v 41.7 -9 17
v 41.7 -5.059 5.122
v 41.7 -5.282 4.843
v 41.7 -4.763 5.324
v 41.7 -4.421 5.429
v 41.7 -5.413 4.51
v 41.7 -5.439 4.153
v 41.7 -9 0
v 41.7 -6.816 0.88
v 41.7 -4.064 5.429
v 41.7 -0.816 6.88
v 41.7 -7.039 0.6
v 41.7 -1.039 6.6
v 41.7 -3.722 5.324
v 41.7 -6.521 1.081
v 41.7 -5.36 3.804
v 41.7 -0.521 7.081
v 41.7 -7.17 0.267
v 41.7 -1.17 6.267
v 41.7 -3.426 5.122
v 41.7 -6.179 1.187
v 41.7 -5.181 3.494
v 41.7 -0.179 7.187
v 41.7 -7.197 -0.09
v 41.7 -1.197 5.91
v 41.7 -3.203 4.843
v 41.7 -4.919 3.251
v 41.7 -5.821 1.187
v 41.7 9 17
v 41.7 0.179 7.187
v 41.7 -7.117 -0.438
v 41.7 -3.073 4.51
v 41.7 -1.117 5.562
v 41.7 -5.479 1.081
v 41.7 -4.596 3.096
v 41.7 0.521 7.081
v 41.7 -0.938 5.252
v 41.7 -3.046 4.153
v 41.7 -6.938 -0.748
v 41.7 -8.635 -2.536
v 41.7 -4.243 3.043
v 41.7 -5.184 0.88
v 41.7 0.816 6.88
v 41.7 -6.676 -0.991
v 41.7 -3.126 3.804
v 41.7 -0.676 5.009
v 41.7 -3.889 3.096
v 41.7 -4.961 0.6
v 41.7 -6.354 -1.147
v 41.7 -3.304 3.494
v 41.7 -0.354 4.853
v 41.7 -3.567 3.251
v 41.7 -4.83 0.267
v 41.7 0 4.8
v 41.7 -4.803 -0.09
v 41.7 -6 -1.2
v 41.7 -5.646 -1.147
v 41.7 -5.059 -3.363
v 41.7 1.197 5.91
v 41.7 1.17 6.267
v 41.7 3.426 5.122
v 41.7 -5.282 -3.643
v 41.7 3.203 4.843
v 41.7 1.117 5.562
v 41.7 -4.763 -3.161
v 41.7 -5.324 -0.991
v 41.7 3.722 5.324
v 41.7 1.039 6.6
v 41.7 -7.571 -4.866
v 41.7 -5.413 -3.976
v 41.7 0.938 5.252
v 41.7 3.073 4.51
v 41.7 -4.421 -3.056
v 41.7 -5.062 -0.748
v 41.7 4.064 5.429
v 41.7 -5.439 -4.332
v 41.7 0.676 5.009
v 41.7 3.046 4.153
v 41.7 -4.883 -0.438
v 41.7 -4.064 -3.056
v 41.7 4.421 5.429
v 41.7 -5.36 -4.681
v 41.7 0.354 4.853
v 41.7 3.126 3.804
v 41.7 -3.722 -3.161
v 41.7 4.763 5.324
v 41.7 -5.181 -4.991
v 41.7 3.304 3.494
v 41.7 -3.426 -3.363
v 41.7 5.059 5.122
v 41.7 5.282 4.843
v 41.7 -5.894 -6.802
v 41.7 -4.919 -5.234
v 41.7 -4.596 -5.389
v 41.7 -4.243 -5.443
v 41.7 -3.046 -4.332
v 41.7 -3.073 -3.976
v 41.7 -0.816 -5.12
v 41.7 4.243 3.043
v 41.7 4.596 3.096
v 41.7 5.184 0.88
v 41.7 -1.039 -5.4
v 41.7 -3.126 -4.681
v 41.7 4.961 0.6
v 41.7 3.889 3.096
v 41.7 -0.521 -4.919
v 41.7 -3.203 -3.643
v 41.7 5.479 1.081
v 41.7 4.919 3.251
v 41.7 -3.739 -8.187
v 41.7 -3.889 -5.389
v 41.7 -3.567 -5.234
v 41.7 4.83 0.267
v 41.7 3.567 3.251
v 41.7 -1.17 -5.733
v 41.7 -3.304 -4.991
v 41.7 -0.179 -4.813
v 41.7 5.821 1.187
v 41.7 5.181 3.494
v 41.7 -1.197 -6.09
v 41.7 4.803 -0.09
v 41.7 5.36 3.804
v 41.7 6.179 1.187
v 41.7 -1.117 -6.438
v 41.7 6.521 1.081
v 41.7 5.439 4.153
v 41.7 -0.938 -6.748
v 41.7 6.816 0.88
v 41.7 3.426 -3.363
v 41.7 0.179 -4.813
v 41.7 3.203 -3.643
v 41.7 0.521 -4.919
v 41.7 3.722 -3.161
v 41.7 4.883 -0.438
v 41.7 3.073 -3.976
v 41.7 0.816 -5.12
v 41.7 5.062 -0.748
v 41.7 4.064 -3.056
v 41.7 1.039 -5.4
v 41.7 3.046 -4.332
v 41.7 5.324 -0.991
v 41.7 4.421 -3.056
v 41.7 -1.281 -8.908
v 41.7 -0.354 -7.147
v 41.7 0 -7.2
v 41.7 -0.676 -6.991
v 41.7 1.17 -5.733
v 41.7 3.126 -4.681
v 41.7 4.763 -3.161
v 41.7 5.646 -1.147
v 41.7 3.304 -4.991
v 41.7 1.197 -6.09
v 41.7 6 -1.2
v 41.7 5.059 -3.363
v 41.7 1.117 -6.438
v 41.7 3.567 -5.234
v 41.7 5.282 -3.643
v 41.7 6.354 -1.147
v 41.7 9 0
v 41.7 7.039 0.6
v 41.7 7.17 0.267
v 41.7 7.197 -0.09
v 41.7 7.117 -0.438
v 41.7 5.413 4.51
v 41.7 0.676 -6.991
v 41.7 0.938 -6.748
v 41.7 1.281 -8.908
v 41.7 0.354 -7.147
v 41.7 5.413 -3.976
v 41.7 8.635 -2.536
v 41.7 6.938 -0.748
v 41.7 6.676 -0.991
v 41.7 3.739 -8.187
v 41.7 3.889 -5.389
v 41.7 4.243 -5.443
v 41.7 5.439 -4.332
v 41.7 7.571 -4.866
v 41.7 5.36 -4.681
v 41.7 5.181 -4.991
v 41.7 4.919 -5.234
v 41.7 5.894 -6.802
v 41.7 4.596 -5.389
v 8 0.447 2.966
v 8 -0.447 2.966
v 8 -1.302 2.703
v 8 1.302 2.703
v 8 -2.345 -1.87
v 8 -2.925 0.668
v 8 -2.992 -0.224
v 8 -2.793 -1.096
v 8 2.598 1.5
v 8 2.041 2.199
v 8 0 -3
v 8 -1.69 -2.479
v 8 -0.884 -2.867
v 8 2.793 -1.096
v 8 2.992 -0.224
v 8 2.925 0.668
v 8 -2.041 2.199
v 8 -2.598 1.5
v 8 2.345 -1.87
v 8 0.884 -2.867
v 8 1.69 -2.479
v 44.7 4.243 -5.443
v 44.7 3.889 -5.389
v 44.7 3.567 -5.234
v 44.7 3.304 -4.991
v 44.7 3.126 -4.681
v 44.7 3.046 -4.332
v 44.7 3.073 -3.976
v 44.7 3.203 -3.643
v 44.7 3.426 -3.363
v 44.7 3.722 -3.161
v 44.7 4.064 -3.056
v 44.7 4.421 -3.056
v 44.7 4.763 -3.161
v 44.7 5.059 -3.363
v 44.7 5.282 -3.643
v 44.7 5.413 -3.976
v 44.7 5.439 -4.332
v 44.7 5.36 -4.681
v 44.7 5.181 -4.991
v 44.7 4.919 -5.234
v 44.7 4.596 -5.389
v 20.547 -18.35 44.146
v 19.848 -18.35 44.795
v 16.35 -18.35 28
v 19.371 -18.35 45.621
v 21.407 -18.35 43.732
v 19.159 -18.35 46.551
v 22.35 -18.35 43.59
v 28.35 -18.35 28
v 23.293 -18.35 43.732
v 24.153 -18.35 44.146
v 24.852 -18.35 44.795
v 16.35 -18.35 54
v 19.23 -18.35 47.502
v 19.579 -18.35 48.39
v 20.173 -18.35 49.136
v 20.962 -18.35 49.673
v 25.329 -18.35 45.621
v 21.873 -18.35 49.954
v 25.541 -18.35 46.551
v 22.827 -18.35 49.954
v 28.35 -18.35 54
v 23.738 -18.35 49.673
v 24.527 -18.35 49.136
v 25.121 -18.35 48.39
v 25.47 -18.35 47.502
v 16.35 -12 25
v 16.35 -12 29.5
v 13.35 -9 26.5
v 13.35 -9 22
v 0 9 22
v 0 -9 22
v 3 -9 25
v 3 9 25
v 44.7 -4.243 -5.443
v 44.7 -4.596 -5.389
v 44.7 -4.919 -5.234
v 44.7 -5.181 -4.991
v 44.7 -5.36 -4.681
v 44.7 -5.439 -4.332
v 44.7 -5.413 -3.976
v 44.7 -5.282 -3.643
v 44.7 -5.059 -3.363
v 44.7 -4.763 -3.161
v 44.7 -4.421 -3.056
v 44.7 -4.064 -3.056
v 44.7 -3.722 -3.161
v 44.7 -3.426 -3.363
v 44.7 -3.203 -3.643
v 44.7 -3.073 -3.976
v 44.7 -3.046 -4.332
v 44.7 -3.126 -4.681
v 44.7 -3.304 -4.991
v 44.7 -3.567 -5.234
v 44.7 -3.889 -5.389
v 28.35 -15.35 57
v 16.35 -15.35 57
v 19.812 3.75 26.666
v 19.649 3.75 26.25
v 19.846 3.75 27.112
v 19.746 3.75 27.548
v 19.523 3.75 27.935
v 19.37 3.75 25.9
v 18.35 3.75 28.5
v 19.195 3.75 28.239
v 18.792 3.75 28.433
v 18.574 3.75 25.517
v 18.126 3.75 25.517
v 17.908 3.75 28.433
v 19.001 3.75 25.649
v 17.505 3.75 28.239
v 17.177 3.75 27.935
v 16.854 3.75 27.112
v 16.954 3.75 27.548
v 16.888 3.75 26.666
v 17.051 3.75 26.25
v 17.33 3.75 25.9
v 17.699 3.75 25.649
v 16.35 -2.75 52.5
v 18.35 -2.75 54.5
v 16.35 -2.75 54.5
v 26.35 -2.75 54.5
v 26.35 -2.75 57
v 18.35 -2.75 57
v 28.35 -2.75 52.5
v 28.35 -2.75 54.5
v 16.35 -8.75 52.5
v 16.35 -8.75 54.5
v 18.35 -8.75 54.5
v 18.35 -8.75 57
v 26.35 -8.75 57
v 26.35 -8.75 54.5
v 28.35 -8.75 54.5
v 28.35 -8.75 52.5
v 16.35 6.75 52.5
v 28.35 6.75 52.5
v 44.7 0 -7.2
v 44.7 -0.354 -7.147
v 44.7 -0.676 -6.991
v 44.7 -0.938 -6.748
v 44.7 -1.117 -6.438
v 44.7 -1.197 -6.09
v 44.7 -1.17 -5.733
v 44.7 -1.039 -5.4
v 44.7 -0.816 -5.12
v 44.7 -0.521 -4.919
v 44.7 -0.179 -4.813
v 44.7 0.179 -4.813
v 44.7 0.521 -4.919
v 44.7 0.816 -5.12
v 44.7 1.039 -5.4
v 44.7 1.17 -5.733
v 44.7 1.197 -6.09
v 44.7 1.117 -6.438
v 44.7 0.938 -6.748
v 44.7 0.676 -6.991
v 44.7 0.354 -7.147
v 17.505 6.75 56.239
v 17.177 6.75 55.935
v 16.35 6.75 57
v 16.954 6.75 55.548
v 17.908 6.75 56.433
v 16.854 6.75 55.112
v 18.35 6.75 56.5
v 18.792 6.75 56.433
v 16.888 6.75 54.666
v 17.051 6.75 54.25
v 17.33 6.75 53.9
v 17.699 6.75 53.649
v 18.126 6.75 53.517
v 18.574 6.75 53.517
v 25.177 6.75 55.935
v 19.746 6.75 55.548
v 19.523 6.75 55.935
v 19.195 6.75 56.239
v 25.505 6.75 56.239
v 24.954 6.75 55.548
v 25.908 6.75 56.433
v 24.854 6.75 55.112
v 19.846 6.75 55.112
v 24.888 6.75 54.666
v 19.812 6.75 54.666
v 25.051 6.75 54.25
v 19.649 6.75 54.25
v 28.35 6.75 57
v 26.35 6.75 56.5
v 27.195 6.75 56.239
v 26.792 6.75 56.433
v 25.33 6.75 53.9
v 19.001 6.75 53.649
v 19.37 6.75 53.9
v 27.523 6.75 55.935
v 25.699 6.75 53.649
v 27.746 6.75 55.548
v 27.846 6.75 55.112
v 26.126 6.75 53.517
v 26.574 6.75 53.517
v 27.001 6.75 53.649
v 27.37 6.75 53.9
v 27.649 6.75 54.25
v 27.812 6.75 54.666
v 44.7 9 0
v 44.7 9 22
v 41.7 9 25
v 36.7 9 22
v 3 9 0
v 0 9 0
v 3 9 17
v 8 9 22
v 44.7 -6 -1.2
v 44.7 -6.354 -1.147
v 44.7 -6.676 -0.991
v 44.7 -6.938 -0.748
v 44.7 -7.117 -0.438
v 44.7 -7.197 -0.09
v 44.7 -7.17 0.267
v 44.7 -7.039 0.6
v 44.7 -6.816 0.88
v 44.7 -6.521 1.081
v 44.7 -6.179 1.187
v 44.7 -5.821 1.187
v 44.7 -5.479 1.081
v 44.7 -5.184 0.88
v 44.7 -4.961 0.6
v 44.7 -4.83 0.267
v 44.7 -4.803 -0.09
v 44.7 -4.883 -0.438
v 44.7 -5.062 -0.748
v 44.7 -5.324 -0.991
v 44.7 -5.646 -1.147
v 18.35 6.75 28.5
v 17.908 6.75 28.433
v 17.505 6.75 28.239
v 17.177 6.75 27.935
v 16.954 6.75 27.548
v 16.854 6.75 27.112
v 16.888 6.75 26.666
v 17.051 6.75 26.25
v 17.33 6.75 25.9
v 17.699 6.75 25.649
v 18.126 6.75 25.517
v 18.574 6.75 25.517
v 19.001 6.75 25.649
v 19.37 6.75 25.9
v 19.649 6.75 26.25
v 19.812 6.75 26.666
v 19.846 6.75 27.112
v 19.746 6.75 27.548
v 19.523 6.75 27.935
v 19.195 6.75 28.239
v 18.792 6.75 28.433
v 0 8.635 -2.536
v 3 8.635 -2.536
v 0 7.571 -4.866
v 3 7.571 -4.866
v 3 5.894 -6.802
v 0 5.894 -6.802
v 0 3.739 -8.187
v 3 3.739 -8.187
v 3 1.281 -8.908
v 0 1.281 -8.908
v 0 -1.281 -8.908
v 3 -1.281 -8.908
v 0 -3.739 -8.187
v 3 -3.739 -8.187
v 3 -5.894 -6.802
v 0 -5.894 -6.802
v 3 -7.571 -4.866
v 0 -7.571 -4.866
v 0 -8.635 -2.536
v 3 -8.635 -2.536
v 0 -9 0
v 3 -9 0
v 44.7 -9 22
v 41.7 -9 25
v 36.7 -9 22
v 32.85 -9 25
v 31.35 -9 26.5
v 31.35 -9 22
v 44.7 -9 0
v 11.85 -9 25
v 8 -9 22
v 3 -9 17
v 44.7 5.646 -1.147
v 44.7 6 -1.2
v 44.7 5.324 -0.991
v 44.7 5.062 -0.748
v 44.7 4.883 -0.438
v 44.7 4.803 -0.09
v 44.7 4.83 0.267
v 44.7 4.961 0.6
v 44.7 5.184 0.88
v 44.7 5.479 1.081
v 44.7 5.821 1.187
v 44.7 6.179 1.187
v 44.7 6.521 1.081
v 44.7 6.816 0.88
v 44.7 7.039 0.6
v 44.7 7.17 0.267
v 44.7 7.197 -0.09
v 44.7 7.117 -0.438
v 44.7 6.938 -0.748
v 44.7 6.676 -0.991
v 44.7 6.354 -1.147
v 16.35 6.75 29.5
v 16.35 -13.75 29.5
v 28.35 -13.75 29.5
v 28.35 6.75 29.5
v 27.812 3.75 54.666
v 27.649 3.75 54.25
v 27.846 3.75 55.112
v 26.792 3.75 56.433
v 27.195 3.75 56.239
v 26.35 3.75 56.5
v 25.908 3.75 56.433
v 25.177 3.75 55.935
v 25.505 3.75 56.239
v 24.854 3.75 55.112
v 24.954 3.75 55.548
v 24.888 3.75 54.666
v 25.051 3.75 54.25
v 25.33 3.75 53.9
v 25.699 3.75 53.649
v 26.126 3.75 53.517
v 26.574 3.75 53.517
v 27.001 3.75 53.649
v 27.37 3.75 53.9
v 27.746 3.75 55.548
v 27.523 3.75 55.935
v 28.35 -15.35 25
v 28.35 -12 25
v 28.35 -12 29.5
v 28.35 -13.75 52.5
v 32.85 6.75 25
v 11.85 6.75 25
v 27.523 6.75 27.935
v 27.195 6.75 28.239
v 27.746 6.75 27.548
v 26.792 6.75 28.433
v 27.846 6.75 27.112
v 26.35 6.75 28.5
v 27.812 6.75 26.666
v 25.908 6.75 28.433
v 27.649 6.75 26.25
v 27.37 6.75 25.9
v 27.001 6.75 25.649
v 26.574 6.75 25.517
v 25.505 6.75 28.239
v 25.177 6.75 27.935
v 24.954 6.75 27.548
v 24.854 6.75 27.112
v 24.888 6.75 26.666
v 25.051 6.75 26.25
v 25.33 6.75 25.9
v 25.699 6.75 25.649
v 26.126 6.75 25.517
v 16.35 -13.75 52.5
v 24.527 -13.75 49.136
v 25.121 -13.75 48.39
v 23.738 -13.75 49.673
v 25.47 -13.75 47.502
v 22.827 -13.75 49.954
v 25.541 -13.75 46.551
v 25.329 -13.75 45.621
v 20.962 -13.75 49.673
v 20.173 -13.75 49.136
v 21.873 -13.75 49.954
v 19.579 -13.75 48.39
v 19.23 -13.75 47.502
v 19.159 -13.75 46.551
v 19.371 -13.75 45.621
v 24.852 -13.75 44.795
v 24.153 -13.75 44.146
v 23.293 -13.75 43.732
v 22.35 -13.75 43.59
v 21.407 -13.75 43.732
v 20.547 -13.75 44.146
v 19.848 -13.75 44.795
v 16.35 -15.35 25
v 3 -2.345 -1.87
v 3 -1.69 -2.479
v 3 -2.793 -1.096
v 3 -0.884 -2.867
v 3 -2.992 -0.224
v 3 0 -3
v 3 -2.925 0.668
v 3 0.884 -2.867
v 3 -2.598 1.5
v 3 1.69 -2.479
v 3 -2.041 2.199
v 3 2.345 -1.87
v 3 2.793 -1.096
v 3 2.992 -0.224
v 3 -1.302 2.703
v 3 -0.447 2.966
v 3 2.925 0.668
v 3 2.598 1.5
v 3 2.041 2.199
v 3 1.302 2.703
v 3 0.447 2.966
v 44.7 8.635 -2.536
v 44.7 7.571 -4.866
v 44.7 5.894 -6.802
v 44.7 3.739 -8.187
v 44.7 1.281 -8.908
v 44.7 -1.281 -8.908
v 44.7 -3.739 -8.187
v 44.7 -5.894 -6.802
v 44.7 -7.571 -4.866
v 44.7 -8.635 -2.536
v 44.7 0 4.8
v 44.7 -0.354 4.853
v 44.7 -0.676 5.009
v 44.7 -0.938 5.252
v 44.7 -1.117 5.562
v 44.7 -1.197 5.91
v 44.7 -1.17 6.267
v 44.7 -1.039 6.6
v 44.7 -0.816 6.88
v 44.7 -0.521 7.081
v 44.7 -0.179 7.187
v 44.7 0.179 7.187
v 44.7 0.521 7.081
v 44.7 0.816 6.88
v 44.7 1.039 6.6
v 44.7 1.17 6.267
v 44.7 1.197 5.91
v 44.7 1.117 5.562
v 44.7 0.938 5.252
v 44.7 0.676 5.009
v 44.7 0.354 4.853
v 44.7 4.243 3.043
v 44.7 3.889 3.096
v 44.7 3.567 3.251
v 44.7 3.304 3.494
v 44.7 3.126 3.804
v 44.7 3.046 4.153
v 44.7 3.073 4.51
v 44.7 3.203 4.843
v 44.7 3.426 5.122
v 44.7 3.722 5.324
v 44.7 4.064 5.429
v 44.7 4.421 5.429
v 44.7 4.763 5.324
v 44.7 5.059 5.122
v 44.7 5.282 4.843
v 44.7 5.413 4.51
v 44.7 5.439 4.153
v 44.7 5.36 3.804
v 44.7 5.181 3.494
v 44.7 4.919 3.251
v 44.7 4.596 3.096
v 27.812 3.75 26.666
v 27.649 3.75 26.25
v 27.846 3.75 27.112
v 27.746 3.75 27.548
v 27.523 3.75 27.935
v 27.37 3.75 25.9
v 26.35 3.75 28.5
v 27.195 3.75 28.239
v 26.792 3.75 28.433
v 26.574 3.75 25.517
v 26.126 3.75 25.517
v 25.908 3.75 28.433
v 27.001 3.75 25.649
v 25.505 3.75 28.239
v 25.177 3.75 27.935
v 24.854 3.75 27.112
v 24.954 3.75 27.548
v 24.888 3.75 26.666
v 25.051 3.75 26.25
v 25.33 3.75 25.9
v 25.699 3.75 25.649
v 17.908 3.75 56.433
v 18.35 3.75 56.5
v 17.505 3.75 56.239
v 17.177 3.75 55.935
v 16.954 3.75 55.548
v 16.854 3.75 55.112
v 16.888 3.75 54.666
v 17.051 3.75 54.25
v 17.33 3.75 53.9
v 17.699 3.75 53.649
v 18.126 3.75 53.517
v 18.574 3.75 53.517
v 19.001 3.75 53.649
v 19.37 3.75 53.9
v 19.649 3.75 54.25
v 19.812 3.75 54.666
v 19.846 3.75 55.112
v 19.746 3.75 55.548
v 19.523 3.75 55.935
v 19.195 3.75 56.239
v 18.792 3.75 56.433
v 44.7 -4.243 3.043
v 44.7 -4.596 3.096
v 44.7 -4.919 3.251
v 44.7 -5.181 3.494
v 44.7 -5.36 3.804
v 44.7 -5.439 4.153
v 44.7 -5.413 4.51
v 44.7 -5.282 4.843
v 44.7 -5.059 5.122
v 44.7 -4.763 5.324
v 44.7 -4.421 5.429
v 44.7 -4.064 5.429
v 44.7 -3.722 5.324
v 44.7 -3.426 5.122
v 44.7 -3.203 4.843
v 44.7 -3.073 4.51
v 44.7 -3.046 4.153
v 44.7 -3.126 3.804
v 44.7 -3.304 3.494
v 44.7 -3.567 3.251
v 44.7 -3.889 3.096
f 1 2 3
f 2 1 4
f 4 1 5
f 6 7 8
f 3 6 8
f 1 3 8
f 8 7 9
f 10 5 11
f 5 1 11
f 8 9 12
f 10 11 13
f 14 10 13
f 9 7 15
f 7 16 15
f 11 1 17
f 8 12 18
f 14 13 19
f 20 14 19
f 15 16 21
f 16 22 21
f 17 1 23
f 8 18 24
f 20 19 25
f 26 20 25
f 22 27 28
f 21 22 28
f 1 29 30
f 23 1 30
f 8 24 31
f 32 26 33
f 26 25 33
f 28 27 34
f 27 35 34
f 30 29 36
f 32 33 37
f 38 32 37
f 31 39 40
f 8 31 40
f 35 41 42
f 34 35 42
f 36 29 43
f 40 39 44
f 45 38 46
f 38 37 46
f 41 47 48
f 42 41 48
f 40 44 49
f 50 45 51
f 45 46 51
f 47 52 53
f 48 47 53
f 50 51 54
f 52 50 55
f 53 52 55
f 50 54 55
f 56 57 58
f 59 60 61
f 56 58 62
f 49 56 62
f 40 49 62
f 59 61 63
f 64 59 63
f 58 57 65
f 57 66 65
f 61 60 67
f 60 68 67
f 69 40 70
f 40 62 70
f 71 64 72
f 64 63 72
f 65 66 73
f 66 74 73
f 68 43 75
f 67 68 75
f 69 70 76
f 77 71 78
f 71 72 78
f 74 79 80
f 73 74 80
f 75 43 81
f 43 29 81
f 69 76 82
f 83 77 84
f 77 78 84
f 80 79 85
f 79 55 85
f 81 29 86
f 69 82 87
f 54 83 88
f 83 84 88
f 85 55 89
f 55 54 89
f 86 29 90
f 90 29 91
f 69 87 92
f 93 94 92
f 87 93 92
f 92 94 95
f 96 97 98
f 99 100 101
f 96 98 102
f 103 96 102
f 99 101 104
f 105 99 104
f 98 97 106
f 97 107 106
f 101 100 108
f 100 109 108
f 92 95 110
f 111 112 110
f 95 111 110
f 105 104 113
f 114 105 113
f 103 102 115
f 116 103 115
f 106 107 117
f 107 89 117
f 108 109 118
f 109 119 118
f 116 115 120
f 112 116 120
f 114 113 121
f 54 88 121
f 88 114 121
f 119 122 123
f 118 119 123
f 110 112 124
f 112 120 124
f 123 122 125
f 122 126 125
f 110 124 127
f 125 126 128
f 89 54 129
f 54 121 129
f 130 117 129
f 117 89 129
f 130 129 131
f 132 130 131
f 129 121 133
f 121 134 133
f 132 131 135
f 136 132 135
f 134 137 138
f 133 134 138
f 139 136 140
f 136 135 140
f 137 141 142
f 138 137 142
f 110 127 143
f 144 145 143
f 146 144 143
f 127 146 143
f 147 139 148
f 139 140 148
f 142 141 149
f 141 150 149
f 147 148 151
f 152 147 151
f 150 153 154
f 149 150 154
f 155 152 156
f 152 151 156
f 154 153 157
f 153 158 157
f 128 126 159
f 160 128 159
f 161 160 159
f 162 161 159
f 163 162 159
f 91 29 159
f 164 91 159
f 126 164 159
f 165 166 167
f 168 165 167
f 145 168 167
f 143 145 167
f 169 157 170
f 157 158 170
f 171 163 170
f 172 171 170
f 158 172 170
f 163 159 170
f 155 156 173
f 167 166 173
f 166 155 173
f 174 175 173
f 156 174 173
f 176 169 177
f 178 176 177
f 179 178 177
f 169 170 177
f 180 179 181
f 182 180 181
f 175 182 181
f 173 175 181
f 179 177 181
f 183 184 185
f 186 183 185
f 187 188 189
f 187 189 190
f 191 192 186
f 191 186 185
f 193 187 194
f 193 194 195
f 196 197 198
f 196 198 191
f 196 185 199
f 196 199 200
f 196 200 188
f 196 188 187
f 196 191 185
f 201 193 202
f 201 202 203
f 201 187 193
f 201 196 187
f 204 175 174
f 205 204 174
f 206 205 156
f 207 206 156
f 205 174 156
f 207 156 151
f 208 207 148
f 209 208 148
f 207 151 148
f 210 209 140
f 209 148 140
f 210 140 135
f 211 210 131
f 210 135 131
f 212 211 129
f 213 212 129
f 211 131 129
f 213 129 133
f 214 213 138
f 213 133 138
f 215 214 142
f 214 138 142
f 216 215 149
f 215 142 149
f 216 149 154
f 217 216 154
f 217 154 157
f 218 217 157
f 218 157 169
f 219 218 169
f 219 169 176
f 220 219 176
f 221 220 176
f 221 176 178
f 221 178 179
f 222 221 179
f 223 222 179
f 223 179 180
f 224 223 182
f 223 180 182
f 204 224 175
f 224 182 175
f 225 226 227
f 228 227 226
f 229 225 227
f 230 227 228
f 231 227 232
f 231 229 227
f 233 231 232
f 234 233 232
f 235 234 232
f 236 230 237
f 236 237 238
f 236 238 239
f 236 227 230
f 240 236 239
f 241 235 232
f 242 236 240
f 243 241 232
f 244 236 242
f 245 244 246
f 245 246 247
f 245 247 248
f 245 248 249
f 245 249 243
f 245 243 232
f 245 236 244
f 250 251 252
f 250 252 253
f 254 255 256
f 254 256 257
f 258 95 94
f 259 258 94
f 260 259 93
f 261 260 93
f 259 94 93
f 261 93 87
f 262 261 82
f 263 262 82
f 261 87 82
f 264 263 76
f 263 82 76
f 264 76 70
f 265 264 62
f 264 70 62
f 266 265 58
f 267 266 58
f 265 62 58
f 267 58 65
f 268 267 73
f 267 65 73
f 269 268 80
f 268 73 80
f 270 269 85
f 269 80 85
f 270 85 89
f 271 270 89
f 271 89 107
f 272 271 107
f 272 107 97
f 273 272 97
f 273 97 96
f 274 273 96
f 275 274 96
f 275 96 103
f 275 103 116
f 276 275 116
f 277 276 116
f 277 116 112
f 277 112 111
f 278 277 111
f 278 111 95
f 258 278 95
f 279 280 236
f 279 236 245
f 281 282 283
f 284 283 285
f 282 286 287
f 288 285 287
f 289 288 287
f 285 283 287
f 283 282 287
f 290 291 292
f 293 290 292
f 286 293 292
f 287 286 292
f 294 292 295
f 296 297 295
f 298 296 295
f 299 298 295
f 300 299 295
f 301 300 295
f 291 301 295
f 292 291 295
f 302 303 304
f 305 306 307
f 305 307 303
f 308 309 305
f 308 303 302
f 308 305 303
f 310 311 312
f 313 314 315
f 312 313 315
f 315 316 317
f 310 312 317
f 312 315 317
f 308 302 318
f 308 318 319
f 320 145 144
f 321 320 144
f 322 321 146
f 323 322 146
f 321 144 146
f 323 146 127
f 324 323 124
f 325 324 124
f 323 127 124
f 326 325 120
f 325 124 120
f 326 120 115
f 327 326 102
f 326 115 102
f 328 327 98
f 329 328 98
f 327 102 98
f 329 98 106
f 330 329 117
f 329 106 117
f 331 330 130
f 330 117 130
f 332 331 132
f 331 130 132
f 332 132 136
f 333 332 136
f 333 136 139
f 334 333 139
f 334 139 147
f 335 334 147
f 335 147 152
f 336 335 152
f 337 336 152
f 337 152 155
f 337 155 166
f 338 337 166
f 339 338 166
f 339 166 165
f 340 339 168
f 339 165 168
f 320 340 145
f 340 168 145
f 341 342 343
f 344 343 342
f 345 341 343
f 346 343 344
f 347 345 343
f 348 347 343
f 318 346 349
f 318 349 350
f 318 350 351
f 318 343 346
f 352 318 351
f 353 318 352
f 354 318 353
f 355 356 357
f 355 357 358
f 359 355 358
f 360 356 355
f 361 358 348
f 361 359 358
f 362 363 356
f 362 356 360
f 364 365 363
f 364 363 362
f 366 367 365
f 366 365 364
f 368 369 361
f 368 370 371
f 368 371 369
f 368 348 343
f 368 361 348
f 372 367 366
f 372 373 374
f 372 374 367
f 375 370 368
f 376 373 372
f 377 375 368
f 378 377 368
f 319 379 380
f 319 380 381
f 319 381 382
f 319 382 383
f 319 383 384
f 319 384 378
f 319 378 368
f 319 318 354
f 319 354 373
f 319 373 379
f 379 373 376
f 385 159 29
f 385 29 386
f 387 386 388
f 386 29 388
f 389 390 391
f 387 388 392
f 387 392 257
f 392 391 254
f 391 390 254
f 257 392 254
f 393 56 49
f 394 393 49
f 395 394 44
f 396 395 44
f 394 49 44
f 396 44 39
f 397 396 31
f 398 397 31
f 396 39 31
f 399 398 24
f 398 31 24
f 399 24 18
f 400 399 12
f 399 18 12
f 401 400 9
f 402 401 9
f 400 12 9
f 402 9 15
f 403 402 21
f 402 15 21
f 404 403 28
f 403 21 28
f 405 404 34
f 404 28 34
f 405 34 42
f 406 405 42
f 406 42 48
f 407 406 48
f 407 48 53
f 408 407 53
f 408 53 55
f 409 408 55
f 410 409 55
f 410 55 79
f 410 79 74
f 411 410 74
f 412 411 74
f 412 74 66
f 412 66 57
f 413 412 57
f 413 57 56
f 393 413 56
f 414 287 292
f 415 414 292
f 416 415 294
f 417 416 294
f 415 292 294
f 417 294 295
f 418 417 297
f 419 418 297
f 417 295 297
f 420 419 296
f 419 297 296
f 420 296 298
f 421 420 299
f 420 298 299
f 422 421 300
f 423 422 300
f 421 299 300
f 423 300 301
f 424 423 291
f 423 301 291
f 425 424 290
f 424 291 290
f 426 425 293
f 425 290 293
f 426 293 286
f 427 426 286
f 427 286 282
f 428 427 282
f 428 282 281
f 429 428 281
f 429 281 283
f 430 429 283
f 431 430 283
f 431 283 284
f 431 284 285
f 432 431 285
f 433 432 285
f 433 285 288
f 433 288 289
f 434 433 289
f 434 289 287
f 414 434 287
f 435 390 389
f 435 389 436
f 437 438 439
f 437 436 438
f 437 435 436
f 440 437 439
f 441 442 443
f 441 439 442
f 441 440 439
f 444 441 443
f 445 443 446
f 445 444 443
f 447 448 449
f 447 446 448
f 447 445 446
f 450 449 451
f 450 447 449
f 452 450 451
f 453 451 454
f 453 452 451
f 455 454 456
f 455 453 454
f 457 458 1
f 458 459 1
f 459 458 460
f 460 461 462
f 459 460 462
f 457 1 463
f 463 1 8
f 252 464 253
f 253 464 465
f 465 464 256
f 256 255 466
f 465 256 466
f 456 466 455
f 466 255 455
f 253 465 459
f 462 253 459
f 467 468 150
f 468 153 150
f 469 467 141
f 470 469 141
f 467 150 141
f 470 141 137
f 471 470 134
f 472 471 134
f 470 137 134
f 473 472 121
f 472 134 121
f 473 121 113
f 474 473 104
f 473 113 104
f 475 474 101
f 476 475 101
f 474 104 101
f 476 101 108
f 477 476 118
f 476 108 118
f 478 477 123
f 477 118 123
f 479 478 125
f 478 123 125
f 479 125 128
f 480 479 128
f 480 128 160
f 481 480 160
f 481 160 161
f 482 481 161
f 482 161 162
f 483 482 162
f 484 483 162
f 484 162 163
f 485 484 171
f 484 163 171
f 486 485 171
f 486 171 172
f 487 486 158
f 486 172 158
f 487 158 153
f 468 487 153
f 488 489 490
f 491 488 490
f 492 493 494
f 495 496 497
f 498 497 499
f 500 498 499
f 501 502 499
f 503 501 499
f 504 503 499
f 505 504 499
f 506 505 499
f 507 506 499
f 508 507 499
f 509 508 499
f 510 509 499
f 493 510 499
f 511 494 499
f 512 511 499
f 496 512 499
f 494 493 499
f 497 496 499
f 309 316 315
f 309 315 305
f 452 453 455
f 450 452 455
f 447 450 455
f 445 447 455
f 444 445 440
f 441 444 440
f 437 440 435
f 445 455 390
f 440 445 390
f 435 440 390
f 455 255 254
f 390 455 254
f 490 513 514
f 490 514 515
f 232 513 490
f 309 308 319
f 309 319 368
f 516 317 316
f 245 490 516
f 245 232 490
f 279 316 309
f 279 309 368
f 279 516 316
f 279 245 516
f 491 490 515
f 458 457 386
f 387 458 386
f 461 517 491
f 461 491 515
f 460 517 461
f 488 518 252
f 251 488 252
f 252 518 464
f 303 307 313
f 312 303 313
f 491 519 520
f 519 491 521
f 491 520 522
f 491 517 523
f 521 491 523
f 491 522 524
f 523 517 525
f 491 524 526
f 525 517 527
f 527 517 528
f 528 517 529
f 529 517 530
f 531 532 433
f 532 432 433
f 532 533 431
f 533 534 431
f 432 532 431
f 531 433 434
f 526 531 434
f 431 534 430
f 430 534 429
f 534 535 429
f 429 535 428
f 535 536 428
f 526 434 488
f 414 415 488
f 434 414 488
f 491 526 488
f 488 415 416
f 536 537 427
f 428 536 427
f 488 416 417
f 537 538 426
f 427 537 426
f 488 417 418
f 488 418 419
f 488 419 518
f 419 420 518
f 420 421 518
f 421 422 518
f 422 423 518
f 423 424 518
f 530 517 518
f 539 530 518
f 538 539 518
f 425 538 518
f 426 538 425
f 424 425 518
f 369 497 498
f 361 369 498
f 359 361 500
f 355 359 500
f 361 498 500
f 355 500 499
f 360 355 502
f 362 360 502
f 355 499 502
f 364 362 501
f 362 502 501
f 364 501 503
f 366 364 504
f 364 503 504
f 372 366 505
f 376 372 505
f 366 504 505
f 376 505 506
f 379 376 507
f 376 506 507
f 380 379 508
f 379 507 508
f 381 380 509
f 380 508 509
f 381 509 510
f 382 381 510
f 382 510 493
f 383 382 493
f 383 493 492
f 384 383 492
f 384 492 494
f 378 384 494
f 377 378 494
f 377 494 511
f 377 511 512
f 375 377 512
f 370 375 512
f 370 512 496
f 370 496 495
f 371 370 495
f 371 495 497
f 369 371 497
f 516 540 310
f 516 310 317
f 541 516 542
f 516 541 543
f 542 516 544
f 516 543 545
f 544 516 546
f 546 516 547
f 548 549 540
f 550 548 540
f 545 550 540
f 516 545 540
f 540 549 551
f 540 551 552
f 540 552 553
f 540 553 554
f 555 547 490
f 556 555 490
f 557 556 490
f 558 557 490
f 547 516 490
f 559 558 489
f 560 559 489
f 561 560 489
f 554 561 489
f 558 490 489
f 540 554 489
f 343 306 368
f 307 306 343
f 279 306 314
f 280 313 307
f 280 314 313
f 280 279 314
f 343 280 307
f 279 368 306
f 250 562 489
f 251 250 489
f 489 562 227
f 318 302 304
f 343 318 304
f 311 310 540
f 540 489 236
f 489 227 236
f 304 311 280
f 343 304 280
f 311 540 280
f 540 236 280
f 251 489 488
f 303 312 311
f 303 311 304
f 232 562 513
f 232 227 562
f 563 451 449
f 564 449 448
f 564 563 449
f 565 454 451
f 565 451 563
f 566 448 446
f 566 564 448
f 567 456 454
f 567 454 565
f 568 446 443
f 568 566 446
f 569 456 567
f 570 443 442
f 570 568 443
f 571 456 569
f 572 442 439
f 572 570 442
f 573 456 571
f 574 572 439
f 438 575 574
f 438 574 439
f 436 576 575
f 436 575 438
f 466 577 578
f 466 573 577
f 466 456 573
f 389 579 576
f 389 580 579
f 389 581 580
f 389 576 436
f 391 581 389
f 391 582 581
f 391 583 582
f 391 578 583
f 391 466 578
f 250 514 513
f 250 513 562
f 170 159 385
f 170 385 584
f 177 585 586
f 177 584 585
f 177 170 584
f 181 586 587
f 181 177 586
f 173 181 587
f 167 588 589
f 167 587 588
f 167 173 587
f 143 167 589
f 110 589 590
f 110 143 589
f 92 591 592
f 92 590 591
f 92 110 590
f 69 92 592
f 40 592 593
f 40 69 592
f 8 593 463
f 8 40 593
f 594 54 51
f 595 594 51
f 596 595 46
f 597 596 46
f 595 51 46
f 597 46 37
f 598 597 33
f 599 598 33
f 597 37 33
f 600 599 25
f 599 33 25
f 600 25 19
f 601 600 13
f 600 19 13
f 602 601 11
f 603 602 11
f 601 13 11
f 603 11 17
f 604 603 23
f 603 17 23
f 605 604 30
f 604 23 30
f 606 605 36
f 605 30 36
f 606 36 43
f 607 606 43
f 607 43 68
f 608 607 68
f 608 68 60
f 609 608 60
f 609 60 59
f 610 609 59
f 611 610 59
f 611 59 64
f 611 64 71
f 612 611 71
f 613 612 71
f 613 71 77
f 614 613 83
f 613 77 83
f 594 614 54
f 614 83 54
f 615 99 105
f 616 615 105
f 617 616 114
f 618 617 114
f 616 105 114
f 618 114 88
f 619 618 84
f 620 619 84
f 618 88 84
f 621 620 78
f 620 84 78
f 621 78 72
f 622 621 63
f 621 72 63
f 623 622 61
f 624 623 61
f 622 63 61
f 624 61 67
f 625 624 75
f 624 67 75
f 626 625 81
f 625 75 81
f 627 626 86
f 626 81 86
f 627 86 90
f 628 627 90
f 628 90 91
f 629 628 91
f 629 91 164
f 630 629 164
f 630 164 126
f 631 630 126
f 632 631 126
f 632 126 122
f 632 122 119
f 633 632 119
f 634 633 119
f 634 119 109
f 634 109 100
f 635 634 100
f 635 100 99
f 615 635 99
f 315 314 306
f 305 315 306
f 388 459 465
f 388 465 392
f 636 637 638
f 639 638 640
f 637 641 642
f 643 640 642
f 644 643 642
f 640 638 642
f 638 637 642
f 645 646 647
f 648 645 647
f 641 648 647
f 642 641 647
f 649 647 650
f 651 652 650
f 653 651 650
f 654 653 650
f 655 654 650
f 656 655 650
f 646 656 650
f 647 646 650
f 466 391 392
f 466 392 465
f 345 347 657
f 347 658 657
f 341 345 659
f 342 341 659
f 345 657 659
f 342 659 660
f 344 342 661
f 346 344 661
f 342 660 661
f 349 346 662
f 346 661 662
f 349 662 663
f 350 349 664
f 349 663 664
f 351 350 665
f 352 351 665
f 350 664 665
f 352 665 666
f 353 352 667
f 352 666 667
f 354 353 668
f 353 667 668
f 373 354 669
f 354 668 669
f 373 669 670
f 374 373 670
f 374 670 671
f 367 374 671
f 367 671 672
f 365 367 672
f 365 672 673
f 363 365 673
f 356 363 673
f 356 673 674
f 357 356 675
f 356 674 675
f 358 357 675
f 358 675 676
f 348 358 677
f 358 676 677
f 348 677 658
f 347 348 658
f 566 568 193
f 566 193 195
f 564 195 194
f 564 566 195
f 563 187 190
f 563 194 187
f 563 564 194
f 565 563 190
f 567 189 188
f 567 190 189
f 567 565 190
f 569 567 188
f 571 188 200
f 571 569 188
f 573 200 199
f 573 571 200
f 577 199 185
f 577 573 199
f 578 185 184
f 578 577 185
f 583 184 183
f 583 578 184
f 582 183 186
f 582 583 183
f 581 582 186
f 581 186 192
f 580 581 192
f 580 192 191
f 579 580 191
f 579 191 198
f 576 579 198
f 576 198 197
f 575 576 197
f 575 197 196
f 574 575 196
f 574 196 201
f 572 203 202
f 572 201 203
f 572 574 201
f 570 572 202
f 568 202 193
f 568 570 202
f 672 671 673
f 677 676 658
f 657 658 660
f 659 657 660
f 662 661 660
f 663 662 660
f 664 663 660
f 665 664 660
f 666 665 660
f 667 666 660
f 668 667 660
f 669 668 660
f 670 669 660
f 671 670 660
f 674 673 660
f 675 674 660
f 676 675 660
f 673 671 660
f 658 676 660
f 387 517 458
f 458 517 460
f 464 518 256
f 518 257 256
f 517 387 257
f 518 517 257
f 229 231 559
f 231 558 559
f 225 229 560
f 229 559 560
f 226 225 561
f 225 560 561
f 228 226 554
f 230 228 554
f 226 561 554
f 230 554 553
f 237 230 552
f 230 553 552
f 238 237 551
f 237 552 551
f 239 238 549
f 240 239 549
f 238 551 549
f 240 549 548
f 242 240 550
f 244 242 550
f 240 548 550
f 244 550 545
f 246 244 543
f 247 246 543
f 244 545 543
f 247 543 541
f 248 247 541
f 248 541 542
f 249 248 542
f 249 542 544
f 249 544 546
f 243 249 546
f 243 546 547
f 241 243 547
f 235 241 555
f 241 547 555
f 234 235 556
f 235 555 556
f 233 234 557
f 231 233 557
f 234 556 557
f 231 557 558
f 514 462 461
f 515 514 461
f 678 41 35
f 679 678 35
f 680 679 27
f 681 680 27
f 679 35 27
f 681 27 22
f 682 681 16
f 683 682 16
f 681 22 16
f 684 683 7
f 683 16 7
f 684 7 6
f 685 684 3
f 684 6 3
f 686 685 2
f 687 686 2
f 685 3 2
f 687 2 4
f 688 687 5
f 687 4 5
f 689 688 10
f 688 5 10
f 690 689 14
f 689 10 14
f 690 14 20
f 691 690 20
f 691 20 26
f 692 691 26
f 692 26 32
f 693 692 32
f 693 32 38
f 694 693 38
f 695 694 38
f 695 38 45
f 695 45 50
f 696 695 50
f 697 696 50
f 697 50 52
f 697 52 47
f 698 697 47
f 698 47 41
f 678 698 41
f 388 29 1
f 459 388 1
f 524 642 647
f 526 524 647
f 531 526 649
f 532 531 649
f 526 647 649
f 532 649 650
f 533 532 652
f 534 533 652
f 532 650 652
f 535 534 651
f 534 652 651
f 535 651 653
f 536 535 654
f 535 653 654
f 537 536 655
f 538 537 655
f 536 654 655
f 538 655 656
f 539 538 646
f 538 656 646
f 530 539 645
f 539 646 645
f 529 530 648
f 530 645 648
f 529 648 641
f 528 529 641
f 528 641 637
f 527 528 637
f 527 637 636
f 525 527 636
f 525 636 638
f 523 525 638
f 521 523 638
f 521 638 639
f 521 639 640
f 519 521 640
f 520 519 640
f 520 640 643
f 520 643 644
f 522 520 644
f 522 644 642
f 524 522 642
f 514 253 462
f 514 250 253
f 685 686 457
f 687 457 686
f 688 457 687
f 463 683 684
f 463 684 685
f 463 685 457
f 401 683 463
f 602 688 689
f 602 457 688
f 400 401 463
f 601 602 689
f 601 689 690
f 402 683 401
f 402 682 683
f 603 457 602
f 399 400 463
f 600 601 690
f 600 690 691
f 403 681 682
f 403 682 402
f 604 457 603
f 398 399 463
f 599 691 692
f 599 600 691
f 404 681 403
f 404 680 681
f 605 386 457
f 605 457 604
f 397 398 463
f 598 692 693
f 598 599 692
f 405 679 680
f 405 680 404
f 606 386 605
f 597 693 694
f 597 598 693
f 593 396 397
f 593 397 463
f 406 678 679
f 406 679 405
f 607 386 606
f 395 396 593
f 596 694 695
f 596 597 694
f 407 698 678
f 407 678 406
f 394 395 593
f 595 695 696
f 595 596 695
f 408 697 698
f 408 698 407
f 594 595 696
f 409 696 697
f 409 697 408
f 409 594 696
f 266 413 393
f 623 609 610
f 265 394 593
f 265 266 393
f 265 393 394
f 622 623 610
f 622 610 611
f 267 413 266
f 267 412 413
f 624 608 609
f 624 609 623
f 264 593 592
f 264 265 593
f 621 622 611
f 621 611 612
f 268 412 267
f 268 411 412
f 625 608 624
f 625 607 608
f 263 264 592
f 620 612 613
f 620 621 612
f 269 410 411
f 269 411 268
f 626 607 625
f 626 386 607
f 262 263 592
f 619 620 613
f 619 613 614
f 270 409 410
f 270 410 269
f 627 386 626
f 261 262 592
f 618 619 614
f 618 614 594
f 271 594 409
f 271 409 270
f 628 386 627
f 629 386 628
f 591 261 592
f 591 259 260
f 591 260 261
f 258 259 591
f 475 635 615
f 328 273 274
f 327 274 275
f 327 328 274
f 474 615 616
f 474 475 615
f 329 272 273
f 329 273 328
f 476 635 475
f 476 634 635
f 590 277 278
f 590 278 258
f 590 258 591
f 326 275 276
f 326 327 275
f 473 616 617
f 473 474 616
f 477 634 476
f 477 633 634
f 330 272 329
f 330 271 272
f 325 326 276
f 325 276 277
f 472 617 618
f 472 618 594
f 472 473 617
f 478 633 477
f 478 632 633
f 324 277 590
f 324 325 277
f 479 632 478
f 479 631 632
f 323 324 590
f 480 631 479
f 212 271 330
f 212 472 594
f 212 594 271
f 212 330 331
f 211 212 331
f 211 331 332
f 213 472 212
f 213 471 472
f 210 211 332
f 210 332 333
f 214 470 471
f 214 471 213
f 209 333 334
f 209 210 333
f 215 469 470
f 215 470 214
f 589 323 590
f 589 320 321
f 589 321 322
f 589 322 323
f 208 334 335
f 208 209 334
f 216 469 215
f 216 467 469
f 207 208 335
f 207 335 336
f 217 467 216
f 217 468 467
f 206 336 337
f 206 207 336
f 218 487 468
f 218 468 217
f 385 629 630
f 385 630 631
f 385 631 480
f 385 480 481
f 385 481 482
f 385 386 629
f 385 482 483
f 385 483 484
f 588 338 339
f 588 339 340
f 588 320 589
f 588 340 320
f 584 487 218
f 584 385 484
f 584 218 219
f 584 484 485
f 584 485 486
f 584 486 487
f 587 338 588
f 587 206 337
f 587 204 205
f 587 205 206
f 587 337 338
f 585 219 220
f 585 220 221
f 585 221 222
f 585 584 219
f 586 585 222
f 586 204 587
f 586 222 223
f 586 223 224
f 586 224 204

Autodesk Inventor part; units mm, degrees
ref_plane "YZ Plane" through (0, 0, 0) normal (1, 0, 0) x (0, 1, 0)
ref_plane "XZ Plane" through (0, 0, 0) normal (0, 1, 0) x (-1, 0, 0)
ref_plane "XY Plane" through (0, 0, 0) normal (0, 0, 1) x (1, 0, 0)
sketch "スケッチ1" plane through (0, 0, 0) normal (1, 0, 0) x (0, 1, 0)
  circle A0 centre (0, 0) radius 9
  line L0 (9, 0) -> (-9, 0)
  line L1 (-9, 0) -> (-9, 25)
  line L2 (-9, 25) -> (9, 25)
  line L3 (9, 25) -> (9, 0)
  dimension "d0" = 18
  dimension "d1" = 25
  dimension "d2" = 18
extrude "押し出し1" add sketch "スケッチ1" along normal blind 3
sketch "スケッチ2" plane through (3, 0, 0) normal (1, 0, 0) x (0, 0, -1)
  line L0 (-25, 9) -> (-25, -9) projected
  line L1 (-25, -9) -> (-22, -9)
  line L2 (-22, -9) -> (-22, 9)
  line L3 (-22, 9) -> (-25, 9)
  line L4 (-25, 9) -> (-25, -9)
  line L5 (0, 9) -> (-25, 9) projected
  point P0 (0, 0)
  point P1 (-25, 9)
  dimension "d5" = 3
extrude "押し出し2" add sketch "スケッチ2" along normal blind 38.7
sketch "スケッチ3" plane through (41.7, 0, 0) normal (1, 0, 0) x (0, 0, -1)
  line L0 (-22, 9) -> (-22, -9) projected
  line L1 (-22, -9) -> (0, -9) projected
  arc A0 (0, -9) -> (0, 9) centre (0, 0) ccw projected
  line L2 (0, 9) -> (-22, 9) projected
  line L3 (-22, -9) -> (-22, 9) projected
  line L4 (-22, 9) -> (-25, 9) projected
  line L5 (-25, 9) -> (-25, -9) projected
  line L6 (-25, -9) -> (-22, -9) projected
extrude "押し出し3" add sketch "スケッチ3" along normal blind 3
sketch "スケッチ4" plane through (0, -9, 25) normal (0, 0, 1) x (1, 0, 0)
  line L0 (28.35, 22.75) -> (16.35, 22.75)
  line L1 (16.35, 22.75) -> (16.35, -4.75)
  line L2 (16.35, -4.75) -> (28.35, -4.75)
  line L3 (28.35, -4.75) -> (28.35, 22.75)
  line L4 (28.35, 22.75) -> (16.35, -4.75) construction
  line L5 (16.35, 22.75) -> (28.35, -4.75) construction
  line L6 (44.7, 18) -> (44.7, 0) projected
  line L7 (0, 0) -> (44.7, 0) projected
  line L8 (28.35, 15.75) -> (16.35, 15.75)
  point P0 (0, 9)
  point P1 (22.35, 9)
  dimension "d10" = 12
  dimension "d11" = 27.5
  dimension "d12" = 22.35
  dimension "d13" = 9
  dimension "d16" = 7
extrude "押し出し4" add sketch "スケッチ4" along normal blind 4.5 contours L3 L7 L1 L8 | L3 L2 L1 L7
sketch "スケッチ5" plane through (0, -9, 25) normal (0, 0, -1) x (-1, 0, 0)
  line L0 (-28.35, -4.75) -> (-28.35, 0) projected
  line L1 (-28.35, -4.75) -> (-16.35, -4.75)
  line L2 (-16.35, -4.75) -> (-16.35, -10.35)
  line L3 (-16.35, -10.35) -> (-28.35, -10.35)
  line L4 (-28.35, -10.35) -> (-28.35, -4.75)
  line L5 (-16.35, 15.75) -> (-16.35, -4.75) projected
  point P0 (0, 9)
  dimension "d17" = 5.6
extrude "押し出し5" add sketch "スケッチ5" against normal blind 32
sketch "スケッチ6" plane through (16.35, -13.75, 29.5) normal (0, 1, 0) x (1, 0, 0)
  line L0 (0, 0) -> (0, -27.5) projected
  line L1 (12, -27.5) -> (0, -27.5)
  line L2 (0, -27.5) -> (0, -23)
  line L3 (0, -23) -> (12, -23)
  line L4 (12, -23) -> (12, -27.5)
  line L5 (12, -27.5) -> (0, -27.5) projected
  line L6 (12, 0) -> (12, -27.5) projected
  point P0 (-16.35, 29.5)
  point P1 (6, -23)
  point P2 (0, -27.5)
  dimension "d20" = 4.5
extrude "押し出し6" add sketch "スケッチ6" along normal blind 20.5
sketch "スケッチ7" plane through (44.7, 0, 0) normal (1, 0, 0) x (0, 0, -1)
  circle A0 centre (0, 0) radius 6 construction
  line L0 (7.5318, 0) -> (-7.5318, 0) construction
  point P0 (-6, 0)
  point P1 (-4.2426, -4.2426)
  point P2 (0, -6)
  point P3 (4.2426, -4.2426)
  point P4 (6, 0)
  point P5 (4.2426, 4.2426)
  point P6 (0, 6)
  point P7 (-4.2426, 4.2426)
  dimension "d23" = 12
  dimension "d26" = 360
hole "穴1" at (44.7, 0, 6) at (44.7, -4.2426, 4.2426) at (44.7, -6, 0) at (44.7, -4.2426, -4.2426) at (44.7, 0, -6) at (44.7, 4.2426, -4.2426) at (44.7, 6, 0) at (44.7, 4.2426, 4.2426) direction (-1, 0, 0) diameter 2.4 depth 6.3 clearance for "Countersunk Flat Head Screw ISO 2009/7046" size "M2" standard "ISO"
sketch "スケッチ8" plane through (16.35, -19.35, 25) normal (0, -1, 0) x (1, 0, 0)
  line L0 (0, 32) -> (12, 32) construction
  line L1 (6, 32) -> (6, 0) construction
  line L2 (0, 0) -> (12, 0) construction
  point P0 (-16.35, -25)
  point P1 (6, 21.79)
  dimension "d35" = 10.21
hole "穴2" at (22.35, -19.35, 46.79) direction (0, 1, 0) diameter 6.4 depth 6.3
sketch "スケッチ9" plane through (16.35, -19.35, 25) normal (0, -1, 0) x (1, 0, 0)
  circle A0 centre (6, 21.79) radius 3.2 projected
  line L0 (12, 0) -> (0, 0) projected
  line L1 (12, 0) -> (12, 32) projected
  line L2 (0, 32) -> (12, 32) projected
  line L3 (0, 0) -> (0, 32) projected
  point P0 (-16.35, -25)
extrude "押し出し7" cut sketch "スケッチ9" against normal blind 1
sketch "スケッチ10" plane through (3, 0, 0) normal (1, 0, 0) x (0, 0, -1)
  circle A0 centre (0, 0) radius 3
  dimension "d45" = 6
extrude "押し出し8" add sketch "スケッチ10" along normal blind 5
sketch "スケッチ11" plane through (16.35, 6.75, 29.5) normal (0, 1, 0) x (1, 0, 0)
  circle A0 centre (6, -17.29) radius 3.2 projected
  line L0 (6, -51.8359) -> (6, 17.2559)
  line L1 (37.0866, -11.5) -> (-25.0866, -11.5)
  line L2 (0, -27.5) -> (12, -27.5) projected
  line L3 (-16.35, 4.5) -> (28.35, 4.5) projected
  point P0 (-16.35, 29.5)
  point P1 (6, -11.5)
  point P2 (10, 2.5)
  point P3 (2, 2.5)
  point P4 (10, -25.5)
  point P5 (2, -25.5)
  dimension "d48" = 16
  dimension "d49" = 8
  dimension "d50" = 2
hole "穴3" at (26.35, 6.75, 27) at (18.35, 6.75, 27) at (26.35, 6.75, 55) at (18.35, 6.75, 55) direction (0, -1, 0) diameter 3 depth 3
chamfer "面取り1" distance 5 angle 45 2 edges at (41.7, 0, 22) (3, 0, 22)
chamfer "面取り2" distance 3 angle 45 2 edges at (22.35, -18.35, 57) (22.35, -18.35, 25)
chamfer "面取り3" distance 4.5 angle 45 2 edges at (16.35, -1.125, 25) (28.35, -1.125, 25)
chamfer "面取り4" distance 3 angle 45 3 edges at (22.35, -9, 25) (16.35, -9, 27.2499) (28.35, -9, 27.2499)
chamfer "面取り5" distance 3 angle 45 2 edges at (0, 0, 25) (44.7, 0, 25)
sketch "スケッチ12" plane through (0, -9, 57) normal (0, 0, 1) x (1, 0, 0)
  point P0 (0, 9)
sketch "スケッチ13" plane through (0, -9, 57) normal (0, 0, 1) x (1, 0, 0)
  line L0 (26.35, 6.25) -> (18.35, 6.25)
  line L1 (18.35, 6.25) -> (18.35, 0.25)
  line L2 (18.35, 0.25) -> (26.35, 0.25)
  line L3 (26.35, 0.25) -> (26.35, 6.25)
  line L4 (26.35, 6.25) -> (18.35, 0.25) construction
  line L5 (18.35, 6.25) -> (26.35, 0.25) construction
  line L6 (16.35, -4.75) -> (28.35, -4.75) projected
  line L7 (28.35, -6.35) -> (28.35, 15.75) projected
  point P0 (0, 9)
  point P1 (22.35, 3.25)
  dimension "d73" = 6
  dimension "d74" = 8
  dimension "d75" = 5
  dimension "d76" = 6
extrude "押し出し9" cut sketch "スケッチ13" against normal blind 10
sketch "スケッチ14" plane through (28.35, -13.75, 52.5) normal (1, 0, 0) x (0, 0, -1)
  line L0 (0, 11) -> (0, 5) projected
  line L1 (-4.5, 11) -> (0, 11) projected
  line L2 (-4.5, 5) -> (-4.5, 11) projected
  line L3 (-4.5, 5) -> (0, 5) projected
  line L4 (-2, 5) -> (-2, 11)
  point P0 (52.5, 13.75)
  dimension "d79" = 2
extrude "押し出し10" cut sketch "スケッチ14" against normal through all contours L0 L3 L4 L1
properties part number "Arm1"
